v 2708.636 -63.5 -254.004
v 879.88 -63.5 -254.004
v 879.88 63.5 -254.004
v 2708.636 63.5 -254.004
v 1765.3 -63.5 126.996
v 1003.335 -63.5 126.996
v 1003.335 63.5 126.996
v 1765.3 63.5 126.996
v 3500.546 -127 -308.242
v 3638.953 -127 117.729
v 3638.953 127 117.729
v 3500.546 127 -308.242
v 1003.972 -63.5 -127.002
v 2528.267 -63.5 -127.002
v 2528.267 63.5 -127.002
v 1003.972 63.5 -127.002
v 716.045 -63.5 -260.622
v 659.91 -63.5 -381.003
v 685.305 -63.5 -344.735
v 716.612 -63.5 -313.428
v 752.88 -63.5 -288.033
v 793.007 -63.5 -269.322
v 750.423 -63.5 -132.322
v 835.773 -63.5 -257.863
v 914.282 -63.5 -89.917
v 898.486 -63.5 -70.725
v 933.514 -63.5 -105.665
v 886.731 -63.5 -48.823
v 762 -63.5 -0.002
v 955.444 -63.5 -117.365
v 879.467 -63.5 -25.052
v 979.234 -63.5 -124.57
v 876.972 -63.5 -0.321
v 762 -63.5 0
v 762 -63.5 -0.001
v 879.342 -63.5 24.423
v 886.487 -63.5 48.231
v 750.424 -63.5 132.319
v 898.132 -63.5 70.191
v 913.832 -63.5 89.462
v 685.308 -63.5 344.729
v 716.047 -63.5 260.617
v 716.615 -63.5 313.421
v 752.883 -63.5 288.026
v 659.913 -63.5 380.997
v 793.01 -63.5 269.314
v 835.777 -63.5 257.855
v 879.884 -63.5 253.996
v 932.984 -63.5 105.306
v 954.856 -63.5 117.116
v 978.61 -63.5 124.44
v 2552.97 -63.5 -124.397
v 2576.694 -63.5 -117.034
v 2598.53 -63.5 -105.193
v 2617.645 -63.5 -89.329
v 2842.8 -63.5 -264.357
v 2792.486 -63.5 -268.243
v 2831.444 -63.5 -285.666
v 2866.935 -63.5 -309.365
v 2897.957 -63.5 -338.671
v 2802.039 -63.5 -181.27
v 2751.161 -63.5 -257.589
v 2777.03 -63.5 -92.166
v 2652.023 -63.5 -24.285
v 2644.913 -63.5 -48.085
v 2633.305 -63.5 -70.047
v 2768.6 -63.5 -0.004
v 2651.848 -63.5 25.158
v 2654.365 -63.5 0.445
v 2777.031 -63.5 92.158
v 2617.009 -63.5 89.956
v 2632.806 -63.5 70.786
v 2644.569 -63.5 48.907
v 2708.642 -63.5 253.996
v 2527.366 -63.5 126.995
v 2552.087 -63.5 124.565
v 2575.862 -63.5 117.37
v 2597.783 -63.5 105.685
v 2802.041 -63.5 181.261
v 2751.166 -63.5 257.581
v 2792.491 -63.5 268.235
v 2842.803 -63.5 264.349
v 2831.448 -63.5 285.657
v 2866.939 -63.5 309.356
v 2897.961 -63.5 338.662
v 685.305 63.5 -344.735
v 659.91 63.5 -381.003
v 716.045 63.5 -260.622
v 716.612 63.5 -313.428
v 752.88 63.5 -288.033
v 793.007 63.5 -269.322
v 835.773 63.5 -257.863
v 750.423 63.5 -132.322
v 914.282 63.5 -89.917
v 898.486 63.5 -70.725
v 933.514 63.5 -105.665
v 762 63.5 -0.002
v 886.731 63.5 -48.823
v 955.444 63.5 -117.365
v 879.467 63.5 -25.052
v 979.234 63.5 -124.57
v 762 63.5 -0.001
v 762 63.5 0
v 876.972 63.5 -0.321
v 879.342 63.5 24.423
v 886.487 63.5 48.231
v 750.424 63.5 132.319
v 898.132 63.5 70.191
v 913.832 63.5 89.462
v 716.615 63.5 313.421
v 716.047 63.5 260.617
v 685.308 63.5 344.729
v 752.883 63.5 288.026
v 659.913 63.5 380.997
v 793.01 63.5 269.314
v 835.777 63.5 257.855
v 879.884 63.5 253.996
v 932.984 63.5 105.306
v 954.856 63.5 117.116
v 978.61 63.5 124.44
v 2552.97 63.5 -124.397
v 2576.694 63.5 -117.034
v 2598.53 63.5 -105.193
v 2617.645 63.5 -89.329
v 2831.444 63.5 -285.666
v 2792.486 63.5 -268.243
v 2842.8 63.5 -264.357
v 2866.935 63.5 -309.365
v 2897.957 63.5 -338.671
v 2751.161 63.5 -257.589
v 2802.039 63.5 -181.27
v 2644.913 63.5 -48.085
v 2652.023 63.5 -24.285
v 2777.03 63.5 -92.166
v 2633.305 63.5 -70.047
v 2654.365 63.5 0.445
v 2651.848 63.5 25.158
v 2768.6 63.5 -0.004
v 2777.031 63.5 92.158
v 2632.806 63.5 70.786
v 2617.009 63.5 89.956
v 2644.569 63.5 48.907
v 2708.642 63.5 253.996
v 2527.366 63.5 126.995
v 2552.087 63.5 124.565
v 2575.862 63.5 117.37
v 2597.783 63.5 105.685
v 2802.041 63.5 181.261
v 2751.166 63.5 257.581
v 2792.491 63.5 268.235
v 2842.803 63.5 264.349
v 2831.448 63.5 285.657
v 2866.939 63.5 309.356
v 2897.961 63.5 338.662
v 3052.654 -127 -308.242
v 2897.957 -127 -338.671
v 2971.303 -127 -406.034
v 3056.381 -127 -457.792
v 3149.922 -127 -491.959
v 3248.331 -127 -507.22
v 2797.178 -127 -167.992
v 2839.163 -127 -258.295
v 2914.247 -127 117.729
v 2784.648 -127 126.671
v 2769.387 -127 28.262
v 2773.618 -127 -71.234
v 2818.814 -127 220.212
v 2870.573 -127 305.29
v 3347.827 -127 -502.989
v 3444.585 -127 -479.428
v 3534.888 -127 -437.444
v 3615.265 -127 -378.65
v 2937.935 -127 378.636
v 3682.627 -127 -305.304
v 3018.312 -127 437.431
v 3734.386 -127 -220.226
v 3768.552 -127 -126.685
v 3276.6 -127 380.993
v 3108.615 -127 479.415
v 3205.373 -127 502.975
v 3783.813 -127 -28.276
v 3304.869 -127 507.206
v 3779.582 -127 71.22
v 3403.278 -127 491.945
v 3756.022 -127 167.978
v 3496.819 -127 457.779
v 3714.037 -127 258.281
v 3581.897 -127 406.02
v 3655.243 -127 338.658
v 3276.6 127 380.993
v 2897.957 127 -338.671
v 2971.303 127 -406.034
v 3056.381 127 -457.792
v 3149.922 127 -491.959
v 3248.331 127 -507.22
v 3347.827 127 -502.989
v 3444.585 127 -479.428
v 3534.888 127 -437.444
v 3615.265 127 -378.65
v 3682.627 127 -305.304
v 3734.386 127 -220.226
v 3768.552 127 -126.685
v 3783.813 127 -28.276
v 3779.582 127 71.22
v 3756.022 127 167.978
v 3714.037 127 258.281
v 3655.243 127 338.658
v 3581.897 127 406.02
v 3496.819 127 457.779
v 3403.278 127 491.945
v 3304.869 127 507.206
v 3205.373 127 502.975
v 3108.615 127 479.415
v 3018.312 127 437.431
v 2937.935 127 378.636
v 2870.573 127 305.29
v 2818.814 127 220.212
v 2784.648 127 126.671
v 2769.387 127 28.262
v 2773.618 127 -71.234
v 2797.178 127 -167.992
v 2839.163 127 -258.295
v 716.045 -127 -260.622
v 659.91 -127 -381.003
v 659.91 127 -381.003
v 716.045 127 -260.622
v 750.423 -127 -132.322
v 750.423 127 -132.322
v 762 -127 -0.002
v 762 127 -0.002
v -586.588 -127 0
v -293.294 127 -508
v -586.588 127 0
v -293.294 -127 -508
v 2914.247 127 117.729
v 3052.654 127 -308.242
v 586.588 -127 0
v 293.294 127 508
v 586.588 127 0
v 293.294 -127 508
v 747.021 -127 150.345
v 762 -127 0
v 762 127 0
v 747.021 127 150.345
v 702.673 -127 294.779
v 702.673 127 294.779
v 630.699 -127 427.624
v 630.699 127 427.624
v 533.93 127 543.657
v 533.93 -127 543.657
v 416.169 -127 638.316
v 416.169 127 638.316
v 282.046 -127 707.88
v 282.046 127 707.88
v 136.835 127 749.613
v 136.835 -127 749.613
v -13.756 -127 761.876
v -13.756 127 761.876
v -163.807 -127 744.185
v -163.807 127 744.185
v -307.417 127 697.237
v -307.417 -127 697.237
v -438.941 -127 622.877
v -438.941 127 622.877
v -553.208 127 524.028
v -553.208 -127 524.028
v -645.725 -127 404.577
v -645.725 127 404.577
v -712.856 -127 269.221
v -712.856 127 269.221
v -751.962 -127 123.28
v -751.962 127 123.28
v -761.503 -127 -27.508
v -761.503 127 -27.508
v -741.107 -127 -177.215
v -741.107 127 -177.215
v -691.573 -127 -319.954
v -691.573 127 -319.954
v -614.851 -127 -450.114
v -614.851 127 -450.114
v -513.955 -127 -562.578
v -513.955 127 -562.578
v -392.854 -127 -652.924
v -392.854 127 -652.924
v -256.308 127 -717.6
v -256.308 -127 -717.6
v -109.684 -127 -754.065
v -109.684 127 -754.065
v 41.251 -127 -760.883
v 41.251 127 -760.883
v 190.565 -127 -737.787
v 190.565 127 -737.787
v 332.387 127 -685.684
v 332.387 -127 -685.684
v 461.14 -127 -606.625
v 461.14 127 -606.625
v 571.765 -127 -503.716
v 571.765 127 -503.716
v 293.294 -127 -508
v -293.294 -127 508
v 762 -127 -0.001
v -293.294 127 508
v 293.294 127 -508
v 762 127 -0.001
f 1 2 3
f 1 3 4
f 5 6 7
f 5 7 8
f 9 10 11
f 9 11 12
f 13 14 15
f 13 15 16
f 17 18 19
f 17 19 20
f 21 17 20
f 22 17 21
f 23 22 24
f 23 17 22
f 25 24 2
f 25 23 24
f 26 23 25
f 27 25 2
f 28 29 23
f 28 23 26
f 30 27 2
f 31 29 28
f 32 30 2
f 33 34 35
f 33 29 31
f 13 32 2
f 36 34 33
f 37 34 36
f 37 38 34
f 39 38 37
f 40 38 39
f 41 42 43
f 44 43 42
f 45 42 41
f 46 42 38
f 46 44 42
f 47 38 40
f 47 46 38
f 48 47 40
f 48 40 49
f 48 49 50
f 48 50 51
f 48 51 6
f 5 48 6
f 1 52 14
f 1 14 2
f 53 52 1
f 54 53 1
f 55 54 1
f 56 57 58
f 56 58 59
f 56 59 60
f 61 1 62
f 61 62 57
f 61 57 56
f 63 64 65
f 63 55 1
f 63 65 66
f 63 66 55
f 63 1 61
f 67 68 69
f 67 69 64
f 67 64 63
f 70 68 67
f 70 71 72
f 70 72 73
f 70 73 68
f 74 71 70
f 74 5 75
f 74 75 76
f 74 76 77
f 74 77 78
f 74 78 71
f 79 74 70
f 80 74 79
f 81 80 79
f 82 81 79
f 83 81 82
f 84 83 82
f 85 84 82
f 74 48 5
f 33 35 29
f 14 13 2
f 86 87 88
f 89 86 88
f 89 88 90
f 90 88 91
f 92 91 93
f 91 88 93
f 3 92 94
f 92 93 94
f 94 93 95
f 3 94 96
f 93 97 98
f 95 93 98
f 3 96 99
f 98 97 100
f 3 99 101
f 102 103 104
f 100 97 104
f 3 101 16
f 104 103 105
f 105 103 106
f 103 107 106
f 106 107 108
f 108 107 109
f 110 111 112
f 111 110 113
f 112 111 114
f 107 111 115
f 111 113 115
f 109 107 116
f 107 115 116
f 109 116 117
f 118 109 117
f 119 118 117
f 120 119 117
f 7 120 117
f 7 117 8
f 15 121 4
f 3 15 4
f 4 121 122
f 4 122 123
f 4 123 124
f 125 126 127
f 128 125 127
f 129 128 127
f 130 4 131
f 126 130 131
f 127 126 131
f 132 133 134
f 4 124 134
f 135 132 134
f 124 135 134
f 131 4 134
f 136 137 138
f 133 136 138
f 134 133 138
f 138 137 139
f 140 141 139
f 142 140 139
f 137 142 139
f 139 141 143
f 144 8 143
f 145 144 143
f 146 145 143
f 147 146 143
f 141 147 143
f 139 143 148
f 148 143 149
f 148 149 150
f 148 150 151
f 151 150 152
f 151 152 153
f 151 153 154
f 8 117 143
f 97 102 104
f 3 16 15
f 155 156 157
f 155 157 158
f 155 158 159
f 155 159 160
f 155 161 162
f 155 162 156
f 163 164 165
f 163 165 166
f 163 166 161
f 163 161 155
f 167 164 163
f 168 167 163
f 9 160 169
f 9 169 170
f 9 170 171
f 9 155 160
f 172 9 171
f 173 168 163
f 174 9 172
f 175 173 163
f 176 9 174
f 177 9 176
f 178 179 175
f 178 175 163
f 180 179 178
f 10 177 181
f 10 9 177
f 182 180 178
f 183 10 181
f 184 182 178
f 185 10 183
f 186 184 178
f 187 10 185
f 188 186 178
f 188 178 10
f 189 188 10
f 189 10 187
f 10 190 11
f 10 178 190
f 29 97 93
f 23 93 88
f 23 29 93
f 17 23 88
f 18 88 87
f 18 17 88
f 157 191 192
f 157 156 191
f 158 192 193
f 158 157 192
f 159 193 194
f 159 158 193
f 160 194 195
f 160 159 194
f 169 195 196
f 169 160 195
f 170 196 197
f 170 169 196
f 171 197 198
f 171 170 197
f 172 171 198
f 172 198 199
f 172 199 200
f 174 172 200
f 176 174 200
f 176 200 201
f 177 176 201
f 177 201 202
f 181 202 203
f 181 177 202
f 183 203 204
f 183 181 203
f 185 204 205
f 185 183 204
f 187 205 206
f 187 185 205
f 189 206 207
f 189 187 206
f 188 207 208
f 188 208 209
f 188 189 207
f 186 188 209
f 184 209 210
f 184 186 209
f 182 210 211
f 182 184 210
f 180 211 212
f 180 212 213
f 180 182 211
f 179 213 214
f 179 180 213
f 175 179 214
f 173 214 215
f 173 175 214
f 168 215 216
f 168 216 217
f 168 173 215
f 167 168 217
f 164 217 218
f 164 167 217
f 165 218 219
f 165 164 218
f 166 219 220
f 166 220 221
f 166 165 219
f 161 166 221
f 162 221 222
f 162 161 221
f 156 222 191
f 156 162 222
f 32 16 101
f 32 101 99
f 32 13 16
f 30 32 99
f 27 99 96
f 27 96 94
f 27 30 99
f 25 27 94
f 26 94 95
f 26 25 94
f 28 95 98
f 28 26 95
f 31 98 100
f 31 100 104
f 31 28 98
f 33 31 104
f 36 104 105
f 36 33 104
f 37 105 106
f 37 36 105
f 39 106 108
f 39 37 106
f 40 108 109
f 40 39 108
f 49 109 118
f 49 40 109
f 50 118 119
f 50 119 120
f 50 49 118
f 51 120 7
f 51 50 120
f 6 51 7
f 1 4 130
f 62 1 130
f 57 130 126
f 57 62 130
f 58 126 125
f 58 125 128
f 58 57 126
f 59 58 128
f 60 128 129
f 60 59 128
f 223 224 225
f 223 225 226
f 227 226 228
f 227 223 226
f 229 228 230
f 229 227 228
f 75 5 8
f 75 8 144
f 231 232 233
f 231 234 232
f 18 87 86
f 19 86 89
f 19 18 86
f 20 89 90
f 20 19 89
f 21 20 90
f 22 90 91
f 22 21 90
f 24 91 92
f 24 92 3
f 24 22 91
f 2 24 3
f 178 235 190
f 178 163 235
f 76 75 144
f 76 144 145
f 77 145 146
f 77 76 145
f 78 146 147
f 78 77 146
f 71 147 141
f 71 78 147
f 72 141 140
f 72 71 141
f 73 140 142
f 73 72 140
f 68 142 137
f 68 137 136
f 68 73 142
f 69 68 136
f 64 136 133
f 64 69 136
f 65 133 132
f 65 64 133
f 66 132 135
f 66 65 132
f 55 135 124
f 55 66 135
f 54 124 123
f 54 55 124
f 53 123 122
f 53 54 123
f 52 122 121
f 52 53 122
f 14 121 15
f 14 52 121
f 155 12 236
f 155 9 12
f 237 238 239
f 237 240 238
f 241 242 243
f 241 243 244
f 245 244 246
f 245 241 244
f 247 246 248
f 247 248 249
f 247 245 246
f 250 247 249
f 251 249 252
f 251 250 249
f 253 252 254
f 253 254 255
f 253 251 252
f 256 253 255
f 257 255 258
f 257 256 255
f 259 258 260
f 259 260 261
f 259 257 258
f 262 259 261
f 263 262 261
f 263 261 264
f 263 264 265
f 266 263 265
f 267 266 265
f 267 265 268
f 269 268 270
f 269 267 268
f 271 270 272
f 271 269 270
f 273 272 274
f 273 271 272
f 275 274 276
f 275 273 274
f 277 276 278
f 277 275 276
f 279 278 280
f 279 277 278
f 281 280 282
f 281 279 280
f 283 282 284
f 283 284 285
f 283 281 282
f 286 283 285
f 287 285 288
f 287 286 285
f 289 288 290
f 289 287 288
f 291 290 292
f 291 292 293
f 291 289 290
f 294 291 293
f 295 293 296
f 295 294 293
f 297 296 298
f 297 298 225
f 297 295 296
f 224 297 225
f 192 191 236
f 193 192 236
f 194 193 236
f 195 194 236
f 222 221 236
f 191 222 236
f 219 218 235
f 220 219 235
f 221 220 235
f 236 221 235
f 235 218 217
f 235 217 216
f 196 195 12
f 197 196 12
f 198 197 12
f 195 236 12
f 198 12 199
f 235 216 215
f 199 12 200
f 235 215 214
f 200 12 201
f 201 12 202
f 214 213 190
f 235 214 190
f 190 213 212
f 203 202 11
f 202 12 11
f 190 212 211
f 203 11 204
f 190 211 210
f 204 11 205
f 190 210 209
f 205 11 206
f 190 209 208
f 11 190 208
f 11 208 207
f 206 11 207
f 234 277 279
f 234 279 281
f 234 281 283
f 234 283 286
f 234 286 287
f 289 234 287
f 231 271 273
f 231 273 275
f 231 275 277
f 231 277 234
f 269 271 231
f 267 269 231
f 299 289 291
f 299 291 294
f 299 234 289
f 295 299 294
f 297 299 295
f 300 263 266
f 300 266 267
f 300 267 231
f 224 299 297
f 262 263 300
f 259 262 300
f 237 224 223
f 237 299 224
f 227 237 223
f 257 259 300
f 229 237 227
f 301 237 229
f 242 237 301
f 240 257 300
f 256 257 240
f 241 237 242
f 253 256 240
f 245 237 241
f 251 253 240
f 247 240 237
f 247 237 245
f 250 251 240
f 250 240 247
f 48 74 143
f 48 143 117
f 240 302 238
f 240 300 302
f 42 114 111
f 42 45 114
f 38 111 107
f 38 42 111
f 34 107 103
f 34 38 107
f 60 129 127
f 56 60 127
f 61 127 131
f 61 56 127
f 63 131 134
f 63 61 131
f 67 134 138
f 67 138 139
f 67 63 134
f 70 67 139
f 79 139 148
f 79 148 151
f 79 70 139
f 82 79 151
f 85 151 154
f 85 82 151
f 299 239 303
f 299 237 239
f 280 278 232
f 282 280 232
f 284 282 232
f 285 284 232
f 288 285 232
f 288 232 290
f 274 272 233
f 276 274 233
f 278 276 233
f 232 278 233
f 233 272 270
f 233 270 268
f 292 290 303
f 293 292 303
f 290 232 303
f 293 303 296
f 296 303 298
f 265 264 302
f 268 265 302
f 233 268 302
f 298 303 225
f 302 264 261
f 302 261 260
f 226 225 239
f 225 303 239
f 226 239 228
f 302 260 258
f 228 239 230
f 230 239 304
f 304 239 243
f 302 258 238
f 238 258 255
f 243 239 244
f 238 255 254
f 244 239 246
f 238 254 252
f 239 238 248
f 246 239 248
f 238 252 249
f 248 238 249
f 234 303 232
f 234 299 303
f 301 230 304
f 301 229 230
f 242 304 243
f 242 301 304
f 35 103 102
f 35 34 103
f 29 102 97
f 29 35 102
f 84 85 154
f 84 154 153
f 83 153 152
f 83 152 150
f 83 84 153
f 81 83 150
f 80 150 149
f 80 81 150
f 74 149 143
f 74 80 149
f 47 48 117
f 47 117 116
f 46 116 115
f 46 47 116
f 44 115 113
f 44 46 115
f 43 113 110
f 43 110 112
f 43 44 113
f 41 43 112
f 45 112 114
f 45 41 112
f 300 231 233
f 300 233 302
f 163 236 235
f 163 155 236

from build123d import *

# Parameters (mm, degrees)
F1_DEPTH = 127
F2_DEPTH = 63.5


with BuildPart() as f1:
    # F0 (on Front) → F1 (new body, symmetric)
    with BuildSketch(Plane.XZ):
        with BuildLine():
            ThreePointArc((761.9999999983, -0.0015987574), (761.9999999996, -0.0007993787), (762, 0))
            ThreePointArc((762, 0), (736.0358947208, 197.21856323), (659.9129614632, 380.997222159))
            ThreePointArc((659.9129614632, 380.997222159), (-761.9999999932, 0.0032075745), (659.9097538887, -381.002777841))
            ThreePointArc((659.9097538887, -381.002777841), (736.034857643, -197.2224336491), (761.9999999983, -0.0015987574))
        make_face()
        Polygon((-586.5878734967, 0), (-293.2939367483, 508), (293.2939367483, 508), (586.5878734967, 0), (293.2939367483, -508), (-293.2939367483, -508), align=None, mode=Mode.SUBTRACT)
    extrude(amount=F1_DEPTH, both=True)


with BuildPart() as f1b:
    # F0 (on Front) → F1, piece 2 (new body, symmetric)
    with BuildSketch(Plane.XZ):
        with BuildLine():
            ThreePointArc((3784.6, -0.0068746569), (3457.8669463157, 474.5521776995), (2897.9610465616, 338.6619059224))
            ThreePointArc((2897.9610465616, 338.6619059224), (2802.0411378026, 181.2605694965), (2768.6000000011, -0.0058088186))
            ThreePointArc((2768.6000000011, -0.0058088186), (2802.0397455008, -181.2706737169), (2897.9572650798, -338.671427411))
            ThreePointArc((2897.9572650798, -338.671427411), (3457.8642968989, -474.5669390004), (3784.6, -0.0068746569))
        make_face()
        Polygon((3638.9525327085, 117.7286002), (3500.5461811234, -308.2423495137), (3052.6538188766, -308.2423495137), (2914.2474672915, 117.7286002), (3276.6, 380.9931253431), align=None, mode=Mode.SUBTRACT)
    extrude(amount=F1_DEPTH, both=True)


with BuildPart() as f2:
    # F0 (on Front) → F2 (new body, symmetric)
    with BuildSketch(Plane.XZ):
        with BuildLine():
            Line((876.9716055234, -0.0018399801), (761.9999999983, -0.0015987574))
            ThreePointArc((761.9999999983, -0.0015987574), (736.034857643, -197.2224336491), (659.9097538887, -381.002777841))
            ThreePointArc((659.9097538887, -381.002777841), (752.8801348259, -288.0329839291), (879.8796718516, -254.003703788))
            Line((879.8796718516, -254.003703788), (1765.2999999997, -254.003703788))
            Line((1765.2999999997, -254.003703788), (1765.2999999997, -127.0021064397))
            Line((1765.2999999997, -127.0021064397), (1003.9716055232, -127.0021064397))
            ThreePointArc((1003.9716055232, -127.0021064397), (914.1689501048, -89.8045734427), (876.9716055234, -0.0018399801))
        make_face()
        with BuildLine():
            ThreePointArc((659.9129614632, 380.997222159), (736.0358947208, 197.21856323), (762, 0))
            ThreePointArc((762, 0), (761.9999999996, -0.0007993787), (761.9999999983, -0.0015987574))
            Line((761.9999999983, -0.0015987574), (876.9716055234, -0.0018399801))
            ThreePointArc((876.9716055234, -0.0018399801), (913.9442189309, 89.5750651129), (1003.3346408523, 126.9962962117))
            Line((1003.3346408523, 126.9962962117), (1765.2999999997, 126.9962962117))
            Line((1765.2999999997, 126.9962962117), (1765.2999999997, 253.996296212))
            Line((1765.2999999997, 253.996296212), (879.8839486176, 253.996296212))
            ThreePointArc((879.8839486176, 253.996296212), (752.8834856449, 288.0261109488), (659.9129614632, 380.997222159))
        make_face()
        with BuildLine():
            Line((2708.6415698423, 253.996296212), (1765.2999999997, 253.996296212))
            Line((1765.2999999997, 253.996296212), (1765.2999999997, 126.9962962117))
            Line((1765.2999999997, 126.9962962117), (1765.3002664593, 126.9962962117))
            Line((1765.3002664593, 126.9962962117), (2527.3657989809, 126.9946973168))
            ThreePointArc((2527.3657989809, 126.9946973168), (2617.1682821472, 89.7970701122), (2654.3655325211, -0.0055691425))
            Line((2654.3655325211, -0.0055691425), (2768.6000000011, -0.0058088186))
            ThreePointArc((2768.6000000011, -0.0058088186), (2802.0411378026, 181.2605694965), (2897.9610465616, 338.6619059224))
            ThreePointArc((2897.9610465616, 338.6619059224), (2812.3359883672, 276.1267907422), (2708.6415698423, 253.996296212))
        make_face()
        with BuildLine():
            Line((1765.2999999997, -127.0021064397), (1765.2999999997, -254.003703788))
            Line((1765.2999999997, -254.003703788), (2708.6358976196, -254.003703788))
            ThreePointArc((2708.6358976196, -254.003703788), (2812.3316106463, -276.1347772371), (2897.9572650798, -338.671427411))
            ThreePointArc((2897.9572650798, -338.671427411), (2802.0397455008, -181.2706737169), (2768.6000000011, -0.0058088186))
            Line((2768.6000000011, -0.0058088186), (2654.3655325211, -0.0055691425))
            ThreePointArc((2654.3655325211, -0.0055691425), (2617.4859952267, -89.4888330211), (2528.266551702, -127.0021064397))
            Line((2528.266551702, -127.0021064397), (1765.2999999997, -127.0021064397))
        make_face()
    extrude(amount=F2_DEPTH, both=True)


solid = Compound([f1.part, f1b.part, f2.part])
